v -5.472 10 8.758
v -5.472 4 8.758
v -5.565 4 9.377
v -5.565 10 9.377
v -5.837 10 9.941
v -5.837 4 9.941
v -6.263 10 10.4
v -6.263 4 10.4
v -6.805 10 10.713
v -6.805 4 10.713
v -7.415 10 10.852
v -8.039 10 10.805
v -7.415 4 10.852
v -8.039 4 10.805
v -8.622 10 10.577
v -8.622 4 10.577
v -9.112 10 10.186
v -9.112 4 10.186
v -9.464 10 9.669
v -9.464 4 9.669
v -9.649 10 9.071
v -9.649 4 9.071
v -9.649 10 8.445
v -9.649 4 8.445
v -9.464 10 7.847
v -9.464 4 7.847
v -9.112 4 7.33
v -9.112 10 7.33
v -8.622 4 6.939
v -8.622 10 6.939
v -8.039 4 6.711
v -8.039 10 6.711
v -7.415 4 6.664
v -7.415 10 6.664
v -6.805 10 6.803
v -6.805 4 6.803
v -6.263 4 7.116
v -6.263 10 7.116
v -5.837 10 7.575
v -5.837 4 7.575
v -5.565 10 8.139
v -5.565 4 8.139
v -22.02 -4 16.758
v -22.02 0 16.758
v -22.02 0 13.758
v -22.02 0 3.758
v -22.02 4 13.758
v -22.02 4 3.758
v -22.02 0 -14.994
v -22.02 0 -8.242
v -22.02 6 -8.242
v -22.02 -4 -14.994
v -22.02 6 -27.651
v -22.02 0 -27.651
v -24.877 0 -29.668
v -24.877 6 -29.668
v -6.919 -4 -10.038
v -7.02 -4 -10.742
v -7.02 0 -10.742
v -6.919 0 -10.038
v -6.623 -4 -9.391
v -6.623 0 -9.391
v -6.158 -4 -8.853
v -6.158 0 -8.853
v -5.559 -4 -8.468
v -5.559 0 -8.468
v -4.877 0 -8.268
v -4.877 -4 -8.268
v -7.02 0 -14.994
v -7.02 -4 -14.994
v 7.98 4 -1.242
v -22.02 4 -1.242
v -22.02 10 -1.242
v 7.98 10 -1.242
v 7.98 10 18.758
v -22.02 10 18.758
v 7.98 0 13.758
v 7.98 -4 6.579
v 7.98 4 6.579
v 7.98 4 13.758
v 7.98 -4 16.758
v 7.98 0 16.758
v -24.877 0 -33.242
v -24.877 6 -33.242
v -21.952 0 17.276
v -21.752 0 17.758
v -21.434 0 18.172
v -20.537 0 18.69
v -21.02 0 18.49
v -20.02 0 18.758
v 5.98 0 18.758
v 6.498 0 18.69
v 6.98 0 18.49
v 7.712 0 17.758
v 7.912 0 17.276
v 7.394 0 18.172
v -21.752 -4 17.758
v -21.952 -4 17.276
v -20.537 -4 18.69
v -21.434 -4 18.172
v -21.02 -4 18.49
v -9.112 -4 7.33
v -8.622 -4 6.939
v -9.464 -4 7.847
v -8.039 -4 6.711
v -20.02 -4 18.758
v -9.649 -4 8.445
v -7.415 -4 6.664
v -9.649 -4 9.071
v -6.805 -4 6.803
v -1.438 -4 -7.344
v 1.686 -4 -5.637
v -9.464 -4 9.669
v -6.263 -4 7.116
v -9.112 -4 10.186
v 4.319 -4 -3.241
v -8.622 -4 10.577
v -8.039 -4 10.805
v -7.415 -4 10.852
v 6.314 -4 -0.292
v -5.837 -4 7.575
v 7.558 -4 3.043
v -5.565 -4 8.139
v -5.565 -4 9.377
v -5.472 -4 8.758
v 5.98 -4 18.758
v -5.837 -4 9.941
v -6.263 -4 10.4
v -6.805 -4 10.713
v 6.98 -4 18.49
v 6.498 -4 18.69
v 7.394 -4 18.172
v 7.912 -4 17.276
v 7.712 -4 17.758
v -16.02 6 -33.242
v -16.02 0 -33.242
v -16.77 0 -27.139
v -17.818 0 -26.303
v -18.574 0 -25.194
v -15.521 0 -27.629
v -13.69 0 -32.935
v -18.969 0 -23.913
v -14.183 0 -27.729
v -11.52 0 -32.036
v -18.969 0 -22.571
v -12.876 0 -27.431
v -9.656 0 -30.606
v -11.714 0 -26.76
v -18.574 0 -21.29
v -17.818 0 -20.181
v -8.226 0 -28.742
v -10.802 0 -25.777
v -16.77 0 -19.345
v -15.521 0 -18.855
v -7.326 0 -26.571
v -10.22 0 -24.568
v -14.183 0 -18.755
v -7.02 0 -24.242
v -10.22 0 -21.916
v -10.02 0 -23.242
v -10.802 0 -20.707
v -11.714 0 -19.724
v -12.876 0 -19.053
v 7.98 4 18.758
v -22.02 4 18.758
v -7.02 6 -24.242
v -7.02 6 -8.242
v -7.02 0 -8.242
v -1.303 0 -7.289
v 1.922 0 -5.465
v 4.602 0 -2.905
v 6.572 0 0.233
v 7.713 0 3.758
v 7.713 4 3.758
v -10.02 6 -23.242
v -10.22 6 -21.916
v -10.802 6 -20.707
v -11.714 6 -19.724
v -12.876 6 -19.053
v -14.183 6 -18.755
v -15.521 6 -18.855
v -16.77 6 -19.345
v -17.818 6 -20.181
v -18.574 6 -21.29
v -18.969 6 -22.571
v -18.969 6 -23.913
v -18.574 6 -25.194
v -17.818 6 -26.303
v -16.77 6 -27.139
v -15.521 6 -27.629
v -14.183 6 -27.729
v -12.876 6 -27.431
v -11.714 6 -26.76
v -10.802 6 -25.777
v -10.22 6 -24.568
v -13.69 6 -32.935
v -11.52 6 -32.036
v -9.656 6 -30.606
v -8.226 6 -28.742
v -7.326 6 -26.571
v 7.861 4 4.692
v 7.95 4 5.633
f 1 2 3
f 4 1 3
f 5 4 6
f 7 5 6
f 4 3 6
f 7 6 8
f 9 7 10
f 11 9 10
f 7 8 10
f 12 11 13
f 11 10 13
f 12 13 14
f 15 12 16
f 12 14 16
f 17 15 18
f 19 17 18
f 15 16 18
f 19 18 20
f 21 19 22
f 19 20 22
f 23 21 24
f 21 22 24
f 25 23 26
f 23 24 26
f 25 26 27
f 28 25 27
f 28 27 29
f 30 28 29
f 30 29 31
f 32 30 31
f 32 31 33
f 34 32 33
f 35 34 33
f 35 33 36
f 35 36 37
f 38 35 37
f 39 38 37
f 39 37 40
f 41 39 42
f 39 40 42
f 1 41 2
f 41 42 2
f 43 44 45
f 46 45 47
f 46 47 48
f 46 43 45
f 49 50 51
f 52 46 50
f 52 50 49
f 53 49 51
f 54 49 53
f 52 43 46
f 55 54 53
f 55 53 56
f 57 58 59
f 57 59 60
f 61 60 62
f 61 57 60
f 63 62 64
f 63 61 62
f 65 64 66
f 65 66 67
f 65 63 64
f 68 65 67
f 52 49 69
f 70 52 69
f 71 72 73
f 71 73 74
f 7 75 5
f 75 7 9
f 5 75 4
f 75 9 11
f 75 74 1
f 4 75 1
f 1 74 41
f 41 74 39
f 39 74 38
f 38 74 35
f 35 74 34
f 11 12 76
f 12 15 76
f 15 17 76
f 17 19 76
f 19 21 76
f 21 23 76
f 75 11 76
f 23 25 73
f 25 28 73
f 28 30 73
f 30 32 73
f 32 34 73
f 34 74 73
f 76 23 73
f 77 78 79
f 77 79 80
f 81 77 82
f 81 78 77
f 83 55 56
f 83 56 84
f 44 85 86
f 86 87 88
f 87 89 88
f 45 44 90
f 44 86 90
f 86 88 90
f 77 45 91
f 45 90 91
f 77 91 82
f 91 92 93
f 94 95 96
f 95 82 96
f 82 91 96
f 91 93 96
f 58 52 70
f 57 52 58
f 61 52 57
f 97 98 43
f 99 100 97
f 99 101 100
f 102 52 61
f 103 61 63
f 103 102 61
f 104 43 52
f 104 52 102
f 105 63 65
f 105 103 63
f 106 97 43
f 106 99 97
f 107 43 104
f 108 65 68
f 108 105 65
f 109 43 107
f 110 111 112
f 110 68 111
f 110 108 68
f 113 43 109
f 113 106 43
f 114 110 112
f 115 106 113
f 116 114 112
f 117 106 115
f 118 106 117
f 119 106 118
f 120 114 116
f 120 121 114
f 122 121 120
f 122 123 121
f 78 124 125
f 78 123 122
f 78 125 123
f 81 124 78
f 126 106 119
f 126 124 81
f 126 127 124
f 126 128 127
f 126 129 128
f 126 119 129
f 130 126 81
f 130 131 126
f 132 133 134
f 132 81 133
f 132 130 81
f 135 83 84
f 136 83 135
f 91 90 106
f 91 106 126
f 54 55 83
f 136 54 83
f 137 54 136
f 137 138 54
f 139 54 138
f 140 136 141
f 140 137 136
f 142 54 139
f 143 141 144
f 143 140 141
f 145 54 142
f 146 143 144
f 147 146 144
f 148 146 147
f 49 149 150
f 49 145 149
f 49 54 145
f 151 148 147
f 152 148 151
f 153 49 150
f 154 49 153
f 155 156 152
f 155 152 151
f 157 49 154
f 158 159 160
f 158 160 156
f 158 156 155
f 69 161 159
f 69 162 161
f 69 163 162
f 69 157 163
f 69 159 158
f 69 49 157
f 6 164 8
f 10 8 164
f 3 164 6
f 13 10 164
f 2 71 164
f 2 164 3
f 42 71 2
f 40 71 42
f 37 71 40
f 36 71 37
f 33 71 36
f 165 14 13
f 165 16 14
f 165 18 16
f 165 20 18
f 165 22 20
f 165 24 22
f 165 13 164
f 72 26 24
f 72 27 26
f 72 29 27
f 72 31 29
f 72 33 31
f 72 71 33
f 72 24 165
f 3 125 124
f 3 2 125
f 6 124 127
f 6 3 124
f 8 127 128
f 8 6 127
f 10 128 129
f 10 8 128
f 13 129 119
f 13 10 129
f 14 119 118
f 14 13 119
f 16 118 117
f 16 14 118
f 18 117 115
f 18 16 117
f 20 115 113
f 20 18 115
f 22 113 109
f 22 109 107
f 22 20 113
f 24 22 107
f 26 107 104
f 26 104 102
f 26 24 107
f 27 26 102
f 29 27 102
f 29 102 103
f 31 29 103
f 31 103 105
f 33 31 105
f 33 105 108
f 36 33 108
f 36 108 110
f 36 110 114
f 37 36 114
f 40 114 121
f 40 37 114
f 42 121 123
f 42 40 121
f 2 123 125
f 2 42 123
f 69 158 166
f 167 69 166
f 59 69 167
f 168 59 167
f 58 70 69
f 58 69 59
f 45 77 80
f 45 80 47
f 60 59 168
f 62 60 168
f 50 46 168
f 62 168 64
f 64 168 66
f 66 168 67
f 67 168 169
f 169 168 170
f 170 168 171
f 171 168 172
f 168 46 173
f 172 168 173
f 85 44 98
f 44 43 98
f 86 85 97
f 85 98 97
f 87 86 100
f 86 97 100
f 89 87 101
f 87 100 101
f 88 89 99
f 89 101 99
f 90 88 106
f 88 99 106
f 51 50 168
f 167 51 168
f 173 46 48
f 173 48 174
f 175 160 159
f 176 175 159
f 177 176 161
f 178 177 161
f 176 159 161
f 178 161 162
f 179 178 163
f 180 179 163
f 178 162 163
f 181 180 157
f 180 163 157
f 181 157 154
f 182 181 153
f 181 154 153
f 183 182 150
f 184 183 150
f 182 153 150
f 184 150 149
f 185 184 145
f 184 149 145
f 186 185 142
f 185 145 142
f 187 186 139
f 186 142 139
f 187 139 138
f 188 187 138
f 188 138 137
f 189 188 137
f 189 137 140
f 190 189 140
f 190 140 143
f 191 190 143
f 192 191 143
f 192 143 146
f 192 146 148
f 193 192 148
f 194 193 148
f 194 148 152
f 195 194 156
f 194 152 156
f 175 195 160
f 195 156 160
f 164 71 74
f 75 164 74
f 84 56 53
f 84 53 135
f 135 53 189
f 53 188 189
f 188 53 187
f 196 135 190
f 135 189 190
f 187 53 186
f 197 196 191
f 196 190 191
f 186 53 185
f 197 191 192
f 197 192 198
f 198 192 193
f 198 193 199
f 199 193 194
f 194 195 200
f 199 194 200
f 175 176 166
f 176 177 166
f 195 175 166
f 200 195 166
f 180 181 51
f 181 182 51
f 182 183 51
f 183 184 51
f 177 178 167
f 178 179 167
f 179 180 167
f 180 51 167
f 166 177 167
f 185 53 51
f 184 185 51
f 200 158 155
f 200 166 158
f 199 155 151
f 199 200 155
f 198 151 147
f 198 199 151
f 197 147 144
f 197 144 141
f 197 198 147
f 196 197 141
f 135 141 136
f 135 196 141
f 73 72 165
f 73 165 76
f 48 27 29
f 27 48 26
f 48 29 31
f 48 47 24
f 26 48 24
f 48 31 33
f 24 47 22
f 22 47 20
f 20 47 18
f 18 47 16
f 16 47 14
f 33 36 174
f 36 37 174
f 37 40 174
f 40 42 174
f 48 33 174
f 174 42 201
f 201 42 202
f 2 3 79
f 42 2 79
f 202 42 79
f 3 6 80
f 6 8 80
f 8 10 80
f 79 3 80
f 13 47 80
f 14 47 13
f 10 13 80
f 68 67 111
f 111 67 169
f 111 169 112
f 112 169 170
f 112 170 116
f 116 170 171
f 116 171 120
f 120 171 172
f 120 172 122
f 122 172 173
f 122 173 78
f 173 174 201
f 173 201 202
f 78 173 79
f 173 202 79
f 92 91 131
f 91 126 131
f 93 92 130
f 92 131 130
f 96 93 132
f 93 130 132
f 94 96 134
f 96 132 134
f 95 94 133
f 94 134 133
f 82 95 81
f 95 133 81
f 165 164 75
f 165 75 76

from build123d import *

# Parameters (mm, degrees)
F0_W        = 30
F0_H        = 5
F0_R        = 2.1
F0_W_2      = 15
F0_H_2      = 6.75205
F1_DEPTH    = 4
F2_DEPTH    = 4
F3_DEPTH    = 6
F4_DEPTH    = 5
F0_R_2      = 4.5
F5_DEPTH    = 6
F6_DEPTH    = 5
F7_R        = 2.5
F8_T1_DEPTH = 78.1025403784
F9_DEPTH    = 6
F10_R       = 9
F11_R       = 2


# Not quite as in the source:
# - a fillet or chamfer that OpenCascade refuses, or shapes differently, is made with other operations: its cross-section is extruded or revolved along the edge and cut away or added


with BuildPart() as f1:
    # F0 (on Front) → F1 (new body)
    with BuildSketch(Plane.XZ):
        with Locations((-7.0197439194, 16.2580000609)):
            Rectangle(F0_W, F0_H)
        Polygon((7.9802560806, 13.7580000609), (-22.0197439194, 13.7580000609), (-22.0197439194, 3.7580000609), (-7.0197439194, 3.7580000609), (7.9802560806, 3.7580000609), align=None)
        with Locations((-7.5721158646, 8.7580000609)):
            Circle(F0_R, mode=Mode.SUBTRACT)
        Polygon((-7.0197439194, 3.7580000609), (-22.0197439194, 3.7580000609), (-22.0197439194, -8.2419999391), (-7.0197439194, -8.2419999391), (7.9802560806, -8.2419999391), (7.9802560806, 3.7580000609), align=None)
        with Locations((-14.5197439194, -11.6180249391)):
            Rectangle(F0_W_2, F0_H_2)
    extrude(amount=F1_DEPTH)

    # F0 (on Front) → F2 (join)
    with BuildSketch(Plane.XZ):
        Polygon((7.9802560806, 13.7580000609), (-22.0197439194, 13.7580000609), (-22.0197439194, 3.7580000609), (-7.0197439194, 3.7580000609), (7.9802560806, 3.7580000609), align=None)
        with Locations((-7.5721158646, 8.7580000609)):
            Circle(F0_R, mode=Mode.SUBTRACT)
    extrude(amount=-F2_DEPTH)


with BuildPart() as f3:
    # F3 (new): a face of the model
    f3_faces = [f1.part.faces().sort_by_distance(p)[0] for p in [
        (-7.0197439194, 4, 13.4417722949),
    ]]
    extrude(f3_faces, amount=F3_DEPTH)

    # F4 (add): a face of the model
    f4_faces = [f3.faces().sort_by_distance(p)[0] for p in [
        (-7.0197439194, 7, 3.7580000609),
    ]]
    extrude(f4_faces, amount=F4_DEPTH)

    # F6 (add): a face of the model
    f6_faces = [f3.faces().sort_by_distance(p)[0] for p in [
        (-7.0197439194, 7, 13.7580000609),
    ]]
    extrude(f6_faces, amount=F6_DEPTH)


with BuildPart() as f1_1:
    add(f1.part)

    # F0 (on Front) → F5 (join)
    with BuildSketch(Plane.XZ):
        with Locations((-14.5197439194, -11.6180249391)):
            Rectangle(F0_W_2, F0_H_2)
        Polygon((-7.0197439194, -14.9940499391), (-22.0197439194, -14.9940499391), (-22.0197439194, -27.6507474482), (-22.0197439194, -33.2419999391), (-7.0197439194, -33.2419999391), align=None)
        with Locations((-14.5197439194, -23.2419999391)):
            Circle(F0_R_2, mode=Mode.SUBTRACT)
    extrude(amount=-F5_DEPTH)

    # F7
    f7_edges = [f1_1.edges().sort_by_distance(p)[0] for p in [
        (-7.019744, -2, -8.242),
    ]]
    fillet(f7_edges, radius=F7_R)

    # F8: fillet of radius 15 on 1 edges, made by hand

    # F8_s2 → F8_t1 (cut)
    with BuildSketch(Plane.XZ.offset(-37.0512701892)):
        with BuildLine():
            ThreePointArc((-4.8768867765, -8.2676416426), (4.3191902709, -3.241296924), (7.9802560806, 6.5785081366))
            Line((7.9802560806, 6.5785081366), (9.4802560806, 6.5785081366))
            Line((9.4802560806, 6.5785081366), (9.4802560806, -8.2419999391))
            Line((9.4802560806, -8.2419999391), (7.9802560806, -9.7419999391))
            ThreePointArc((7.9802560806, -9.7419999391), (-4.5197439194, -9.7419999391), (-4.6626010622, -9.7522566205))
            Line((-4.6626010622, -9.7522566205), (-4.8768867765, -8.2676416426))
        make_face()
    extrude(amount=F8_T1_DEPTH, mode=Mode.SUBTRACT)

    # F0 (on Front) → F9 (join)
    with BuildSketch(Plane.XZ):
        Polygon((-22.0197439194, -33.2419999391), (-22.0197439194, -27.6507474482), (-24.877268821, -29.6678245068), (-24.877268821, -33.2419999391), align=None)
    extrude(amount=-F9_DEPTH)

    # F10
    f10_edges = [f1_1.edges().sort_by_distance(p)[0] for p in [
        (-7.019744, 3, -33.242),
    ]]
    fillet(f10_edges, radius=F10_R)

    # F11
    f11_edges = [f1_1.edges().sort_by_distance(p)[0] for p in [
        (-22.019744, -2, 18.758),
        (7.980256, -2, 18.758),
    ]]
    fillet(f11_edges, radius=F11_R)


solid = Compound([f3.part, f1_1.part])
